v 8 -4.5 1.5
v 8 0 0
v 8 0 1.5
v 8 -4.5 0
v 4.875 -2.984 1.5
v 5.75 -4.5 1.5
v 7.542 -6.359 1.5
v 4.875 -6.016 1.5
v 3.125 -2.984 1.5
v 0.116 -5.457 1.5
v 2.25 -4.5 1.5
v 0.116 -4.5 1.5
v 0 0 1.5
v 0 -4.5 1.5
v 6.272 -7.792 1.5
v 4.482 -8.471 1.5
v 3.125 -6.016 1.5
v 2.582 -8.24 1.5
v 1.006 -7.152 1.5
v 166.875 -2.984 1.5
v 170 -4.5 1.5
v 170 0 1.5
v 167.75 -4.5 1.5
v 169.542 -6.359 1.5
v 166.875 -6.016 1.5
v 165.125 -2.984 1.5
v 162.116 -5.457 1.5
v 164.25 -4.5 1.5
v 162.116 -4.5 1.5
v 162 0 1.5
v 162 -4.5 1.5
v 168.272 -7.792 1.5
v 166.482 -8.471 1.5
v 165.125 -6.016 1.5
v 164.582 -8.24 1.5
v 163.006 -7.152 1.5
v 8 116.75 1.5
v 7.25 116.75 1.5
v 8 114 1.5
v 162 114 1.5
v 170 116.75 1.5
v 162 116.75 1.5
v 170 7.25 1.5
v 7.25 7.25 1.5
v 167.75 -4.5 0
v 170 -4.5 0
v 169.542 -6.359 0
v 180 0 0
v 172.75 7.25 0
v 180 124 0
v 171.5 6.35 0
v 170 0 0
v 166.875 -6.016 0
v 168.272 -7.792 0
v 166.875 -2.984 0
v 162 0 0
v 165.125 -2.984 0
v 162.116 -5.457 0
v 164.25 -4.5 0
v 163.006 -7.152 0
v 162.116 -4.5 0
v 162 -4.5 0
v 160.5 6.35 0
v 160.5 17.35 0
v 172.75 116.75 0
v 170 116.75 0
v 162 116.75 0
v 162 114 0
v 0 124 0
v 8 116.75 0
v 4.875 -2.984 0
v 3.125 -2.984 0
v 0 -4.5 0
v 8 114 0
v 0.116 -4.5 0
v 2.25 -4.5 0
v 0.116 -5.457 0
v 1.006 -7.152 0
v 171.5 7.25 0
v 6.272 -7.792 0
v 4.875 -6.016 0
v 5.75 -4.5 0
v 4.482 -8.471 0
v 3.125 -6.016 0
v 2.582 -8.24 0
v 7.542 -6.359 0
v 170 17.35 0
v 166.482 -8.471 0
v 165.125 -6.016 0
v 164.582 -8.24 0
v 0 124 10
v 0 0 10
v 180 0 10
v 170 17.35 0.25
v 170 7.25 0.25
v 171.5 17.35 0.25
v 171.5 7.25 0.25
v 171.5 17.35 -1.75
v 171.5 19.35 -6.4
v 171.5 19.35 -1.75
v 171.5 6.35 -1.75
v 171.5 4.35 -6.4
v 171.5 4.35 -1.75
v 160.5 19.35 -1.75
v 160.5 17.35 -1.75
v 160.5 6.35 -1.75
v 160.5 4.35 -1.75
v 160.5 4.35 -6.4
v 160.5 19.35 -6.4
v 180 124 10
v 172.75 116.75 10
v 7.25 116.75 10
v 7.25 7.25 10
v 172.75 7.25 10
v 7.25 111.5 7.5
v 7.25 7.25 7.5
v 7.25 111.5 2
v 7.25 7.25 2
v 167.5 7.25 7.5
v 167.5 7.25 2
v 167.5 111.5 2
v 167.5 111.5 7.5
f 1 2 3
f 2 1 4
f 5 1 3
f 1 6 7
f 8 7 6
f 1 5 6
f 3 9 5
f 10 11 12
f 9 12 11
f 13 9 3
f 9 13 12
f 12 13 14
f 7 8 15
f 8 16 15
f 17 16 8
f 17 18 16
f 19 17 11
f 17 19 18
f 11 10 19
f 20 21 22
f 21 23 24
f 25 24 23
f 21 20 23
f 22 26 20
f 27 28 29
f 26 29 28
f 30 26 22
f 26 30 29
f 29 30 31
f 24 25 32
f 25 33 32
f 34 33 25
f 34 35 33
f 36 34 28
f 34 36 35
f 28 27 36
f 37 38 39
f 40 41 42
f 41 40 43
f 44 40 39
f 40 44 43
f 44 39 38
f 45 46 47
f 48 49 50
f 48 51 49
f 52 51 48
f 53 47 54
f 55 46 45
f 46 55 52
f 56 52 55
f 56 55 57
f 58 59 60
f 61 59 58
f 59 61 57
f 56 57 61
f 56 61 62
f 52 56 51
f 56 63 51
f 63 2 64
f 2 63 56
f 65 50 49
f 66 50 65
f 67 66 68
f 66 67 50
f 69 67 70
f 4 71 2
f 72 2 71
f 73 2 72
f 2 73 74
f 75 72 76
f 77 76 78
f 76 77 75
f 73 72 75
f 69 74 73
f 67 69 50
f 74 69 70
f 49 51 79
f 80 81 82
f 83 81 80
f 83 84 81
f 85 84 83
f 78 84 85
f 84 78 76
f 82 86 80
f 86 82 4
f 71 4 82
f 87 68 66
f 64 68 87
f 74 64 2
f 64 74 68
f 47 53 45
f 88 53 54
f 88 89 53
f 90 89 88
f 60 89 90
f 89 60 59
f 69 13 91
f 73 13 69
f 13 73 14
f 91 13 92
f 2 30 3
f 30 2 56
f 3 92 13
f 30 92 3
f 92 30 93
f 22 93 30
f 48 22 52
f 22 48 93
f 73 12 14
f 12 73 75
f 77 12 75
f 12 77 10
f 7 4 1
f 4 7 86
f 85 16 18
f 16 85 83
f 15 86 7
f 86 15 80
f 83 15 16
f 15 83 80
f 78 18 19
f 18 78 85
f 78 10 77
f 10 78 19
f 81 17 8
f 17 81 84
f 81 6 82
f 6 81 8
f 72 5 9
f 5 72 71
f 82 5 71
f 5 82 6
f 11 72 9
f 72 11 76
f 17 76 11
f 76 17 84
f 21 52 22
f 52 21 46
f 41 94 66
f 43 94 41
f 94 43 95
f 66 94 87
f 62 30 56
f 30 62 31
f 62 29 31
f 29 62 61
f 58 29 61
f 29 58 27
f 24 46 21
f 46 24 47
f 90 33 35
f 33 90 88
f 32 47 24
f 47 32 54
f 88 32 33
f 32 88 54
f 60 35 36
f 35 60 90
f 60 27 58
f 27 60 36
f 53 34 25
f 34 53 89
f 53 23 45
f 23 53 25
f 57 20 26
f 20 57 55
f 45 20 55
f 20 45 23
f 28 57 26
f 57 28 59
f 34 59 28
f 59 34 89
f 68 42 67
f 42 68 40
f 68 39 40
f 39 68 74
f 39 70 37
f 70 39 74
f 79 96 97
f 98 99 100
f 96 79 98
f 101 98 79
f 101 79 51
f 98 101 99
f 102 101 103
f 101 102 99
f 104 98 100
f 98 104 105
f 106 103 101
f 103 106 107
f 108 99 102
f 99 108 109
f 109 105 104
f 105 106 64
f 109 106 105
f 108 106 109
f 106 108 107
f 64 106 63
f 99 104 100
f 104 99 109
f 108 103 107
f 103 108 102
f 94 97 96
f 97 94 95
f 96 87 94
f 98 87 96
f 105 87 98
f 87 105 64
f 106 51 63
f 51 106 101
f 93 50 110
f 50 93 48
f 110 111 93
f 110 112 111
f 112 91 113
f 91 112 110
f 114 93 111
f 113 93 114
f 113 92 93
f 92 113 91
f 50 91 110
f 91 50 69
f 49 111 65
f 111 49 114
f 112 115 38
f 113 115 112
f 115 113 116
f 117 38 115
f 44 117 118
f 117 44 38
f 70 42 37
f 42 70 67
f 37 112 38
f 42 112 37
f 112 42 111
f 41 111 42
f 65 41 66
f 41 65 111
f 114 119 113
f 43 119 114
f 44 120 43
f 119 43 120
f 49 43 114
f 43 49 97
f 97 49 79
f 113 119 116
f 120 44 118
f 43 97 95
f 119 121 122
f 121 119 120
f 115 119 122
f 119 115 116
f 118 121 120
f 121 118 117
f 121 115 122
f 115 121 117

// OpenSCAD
module display(){
color("black"){
cube([165,109,5.5]);}}

module hdmi(){
color("grey"){
  cube([11,15,4.65]);
translate([0,2,4.65])
    cube([11,11,2]);
}
}

module lash(){
        difference(){
            // UNION: Kombiniere Würfel + Zylinder zur Lasche
            union(){
                cube([8,4.5,1.5]);
                translate([4,0,0])
                cylinder(h=1.5,d=8,center=false);
            }
            // Ziehe das Bohrloch ab
            translate([4,0,0])
            cylinder(h=4,d=3.5,center=true);
        }
    
}

module platine(){

    color("green"){
    // Hauptplatine
    cube([170,114,1.5]);
    
    // Lasche unten links
    translate([0, -4.5, 0])
    lash();
    
    // Lasche unten rechts
    translate([170-8, -4.5, 0])

    lash();
    
    // Lasche oben rechts
    translate([170, 114, 0])
    rotate([0, 0, 180])
    translate([0, -4.5, 0])
    lash();
    
    // Lasche oben links
    translate([8, 114, 0])
    rotate([0, 0, 180])
    translate([0, -4.5, 0])
    lash();
    }
}

module lcd() {
translate([2.5,2.5,2])
display();
// Platine rendern
platine();
translate([170 + 1.5 - 11,4.35,-6.4])
hdmi();
difference(){
cube([180,124,10]);
translate([7.25,7.25,-3])
cube([165.5, 109.5,80]);

}
}

lcd();
